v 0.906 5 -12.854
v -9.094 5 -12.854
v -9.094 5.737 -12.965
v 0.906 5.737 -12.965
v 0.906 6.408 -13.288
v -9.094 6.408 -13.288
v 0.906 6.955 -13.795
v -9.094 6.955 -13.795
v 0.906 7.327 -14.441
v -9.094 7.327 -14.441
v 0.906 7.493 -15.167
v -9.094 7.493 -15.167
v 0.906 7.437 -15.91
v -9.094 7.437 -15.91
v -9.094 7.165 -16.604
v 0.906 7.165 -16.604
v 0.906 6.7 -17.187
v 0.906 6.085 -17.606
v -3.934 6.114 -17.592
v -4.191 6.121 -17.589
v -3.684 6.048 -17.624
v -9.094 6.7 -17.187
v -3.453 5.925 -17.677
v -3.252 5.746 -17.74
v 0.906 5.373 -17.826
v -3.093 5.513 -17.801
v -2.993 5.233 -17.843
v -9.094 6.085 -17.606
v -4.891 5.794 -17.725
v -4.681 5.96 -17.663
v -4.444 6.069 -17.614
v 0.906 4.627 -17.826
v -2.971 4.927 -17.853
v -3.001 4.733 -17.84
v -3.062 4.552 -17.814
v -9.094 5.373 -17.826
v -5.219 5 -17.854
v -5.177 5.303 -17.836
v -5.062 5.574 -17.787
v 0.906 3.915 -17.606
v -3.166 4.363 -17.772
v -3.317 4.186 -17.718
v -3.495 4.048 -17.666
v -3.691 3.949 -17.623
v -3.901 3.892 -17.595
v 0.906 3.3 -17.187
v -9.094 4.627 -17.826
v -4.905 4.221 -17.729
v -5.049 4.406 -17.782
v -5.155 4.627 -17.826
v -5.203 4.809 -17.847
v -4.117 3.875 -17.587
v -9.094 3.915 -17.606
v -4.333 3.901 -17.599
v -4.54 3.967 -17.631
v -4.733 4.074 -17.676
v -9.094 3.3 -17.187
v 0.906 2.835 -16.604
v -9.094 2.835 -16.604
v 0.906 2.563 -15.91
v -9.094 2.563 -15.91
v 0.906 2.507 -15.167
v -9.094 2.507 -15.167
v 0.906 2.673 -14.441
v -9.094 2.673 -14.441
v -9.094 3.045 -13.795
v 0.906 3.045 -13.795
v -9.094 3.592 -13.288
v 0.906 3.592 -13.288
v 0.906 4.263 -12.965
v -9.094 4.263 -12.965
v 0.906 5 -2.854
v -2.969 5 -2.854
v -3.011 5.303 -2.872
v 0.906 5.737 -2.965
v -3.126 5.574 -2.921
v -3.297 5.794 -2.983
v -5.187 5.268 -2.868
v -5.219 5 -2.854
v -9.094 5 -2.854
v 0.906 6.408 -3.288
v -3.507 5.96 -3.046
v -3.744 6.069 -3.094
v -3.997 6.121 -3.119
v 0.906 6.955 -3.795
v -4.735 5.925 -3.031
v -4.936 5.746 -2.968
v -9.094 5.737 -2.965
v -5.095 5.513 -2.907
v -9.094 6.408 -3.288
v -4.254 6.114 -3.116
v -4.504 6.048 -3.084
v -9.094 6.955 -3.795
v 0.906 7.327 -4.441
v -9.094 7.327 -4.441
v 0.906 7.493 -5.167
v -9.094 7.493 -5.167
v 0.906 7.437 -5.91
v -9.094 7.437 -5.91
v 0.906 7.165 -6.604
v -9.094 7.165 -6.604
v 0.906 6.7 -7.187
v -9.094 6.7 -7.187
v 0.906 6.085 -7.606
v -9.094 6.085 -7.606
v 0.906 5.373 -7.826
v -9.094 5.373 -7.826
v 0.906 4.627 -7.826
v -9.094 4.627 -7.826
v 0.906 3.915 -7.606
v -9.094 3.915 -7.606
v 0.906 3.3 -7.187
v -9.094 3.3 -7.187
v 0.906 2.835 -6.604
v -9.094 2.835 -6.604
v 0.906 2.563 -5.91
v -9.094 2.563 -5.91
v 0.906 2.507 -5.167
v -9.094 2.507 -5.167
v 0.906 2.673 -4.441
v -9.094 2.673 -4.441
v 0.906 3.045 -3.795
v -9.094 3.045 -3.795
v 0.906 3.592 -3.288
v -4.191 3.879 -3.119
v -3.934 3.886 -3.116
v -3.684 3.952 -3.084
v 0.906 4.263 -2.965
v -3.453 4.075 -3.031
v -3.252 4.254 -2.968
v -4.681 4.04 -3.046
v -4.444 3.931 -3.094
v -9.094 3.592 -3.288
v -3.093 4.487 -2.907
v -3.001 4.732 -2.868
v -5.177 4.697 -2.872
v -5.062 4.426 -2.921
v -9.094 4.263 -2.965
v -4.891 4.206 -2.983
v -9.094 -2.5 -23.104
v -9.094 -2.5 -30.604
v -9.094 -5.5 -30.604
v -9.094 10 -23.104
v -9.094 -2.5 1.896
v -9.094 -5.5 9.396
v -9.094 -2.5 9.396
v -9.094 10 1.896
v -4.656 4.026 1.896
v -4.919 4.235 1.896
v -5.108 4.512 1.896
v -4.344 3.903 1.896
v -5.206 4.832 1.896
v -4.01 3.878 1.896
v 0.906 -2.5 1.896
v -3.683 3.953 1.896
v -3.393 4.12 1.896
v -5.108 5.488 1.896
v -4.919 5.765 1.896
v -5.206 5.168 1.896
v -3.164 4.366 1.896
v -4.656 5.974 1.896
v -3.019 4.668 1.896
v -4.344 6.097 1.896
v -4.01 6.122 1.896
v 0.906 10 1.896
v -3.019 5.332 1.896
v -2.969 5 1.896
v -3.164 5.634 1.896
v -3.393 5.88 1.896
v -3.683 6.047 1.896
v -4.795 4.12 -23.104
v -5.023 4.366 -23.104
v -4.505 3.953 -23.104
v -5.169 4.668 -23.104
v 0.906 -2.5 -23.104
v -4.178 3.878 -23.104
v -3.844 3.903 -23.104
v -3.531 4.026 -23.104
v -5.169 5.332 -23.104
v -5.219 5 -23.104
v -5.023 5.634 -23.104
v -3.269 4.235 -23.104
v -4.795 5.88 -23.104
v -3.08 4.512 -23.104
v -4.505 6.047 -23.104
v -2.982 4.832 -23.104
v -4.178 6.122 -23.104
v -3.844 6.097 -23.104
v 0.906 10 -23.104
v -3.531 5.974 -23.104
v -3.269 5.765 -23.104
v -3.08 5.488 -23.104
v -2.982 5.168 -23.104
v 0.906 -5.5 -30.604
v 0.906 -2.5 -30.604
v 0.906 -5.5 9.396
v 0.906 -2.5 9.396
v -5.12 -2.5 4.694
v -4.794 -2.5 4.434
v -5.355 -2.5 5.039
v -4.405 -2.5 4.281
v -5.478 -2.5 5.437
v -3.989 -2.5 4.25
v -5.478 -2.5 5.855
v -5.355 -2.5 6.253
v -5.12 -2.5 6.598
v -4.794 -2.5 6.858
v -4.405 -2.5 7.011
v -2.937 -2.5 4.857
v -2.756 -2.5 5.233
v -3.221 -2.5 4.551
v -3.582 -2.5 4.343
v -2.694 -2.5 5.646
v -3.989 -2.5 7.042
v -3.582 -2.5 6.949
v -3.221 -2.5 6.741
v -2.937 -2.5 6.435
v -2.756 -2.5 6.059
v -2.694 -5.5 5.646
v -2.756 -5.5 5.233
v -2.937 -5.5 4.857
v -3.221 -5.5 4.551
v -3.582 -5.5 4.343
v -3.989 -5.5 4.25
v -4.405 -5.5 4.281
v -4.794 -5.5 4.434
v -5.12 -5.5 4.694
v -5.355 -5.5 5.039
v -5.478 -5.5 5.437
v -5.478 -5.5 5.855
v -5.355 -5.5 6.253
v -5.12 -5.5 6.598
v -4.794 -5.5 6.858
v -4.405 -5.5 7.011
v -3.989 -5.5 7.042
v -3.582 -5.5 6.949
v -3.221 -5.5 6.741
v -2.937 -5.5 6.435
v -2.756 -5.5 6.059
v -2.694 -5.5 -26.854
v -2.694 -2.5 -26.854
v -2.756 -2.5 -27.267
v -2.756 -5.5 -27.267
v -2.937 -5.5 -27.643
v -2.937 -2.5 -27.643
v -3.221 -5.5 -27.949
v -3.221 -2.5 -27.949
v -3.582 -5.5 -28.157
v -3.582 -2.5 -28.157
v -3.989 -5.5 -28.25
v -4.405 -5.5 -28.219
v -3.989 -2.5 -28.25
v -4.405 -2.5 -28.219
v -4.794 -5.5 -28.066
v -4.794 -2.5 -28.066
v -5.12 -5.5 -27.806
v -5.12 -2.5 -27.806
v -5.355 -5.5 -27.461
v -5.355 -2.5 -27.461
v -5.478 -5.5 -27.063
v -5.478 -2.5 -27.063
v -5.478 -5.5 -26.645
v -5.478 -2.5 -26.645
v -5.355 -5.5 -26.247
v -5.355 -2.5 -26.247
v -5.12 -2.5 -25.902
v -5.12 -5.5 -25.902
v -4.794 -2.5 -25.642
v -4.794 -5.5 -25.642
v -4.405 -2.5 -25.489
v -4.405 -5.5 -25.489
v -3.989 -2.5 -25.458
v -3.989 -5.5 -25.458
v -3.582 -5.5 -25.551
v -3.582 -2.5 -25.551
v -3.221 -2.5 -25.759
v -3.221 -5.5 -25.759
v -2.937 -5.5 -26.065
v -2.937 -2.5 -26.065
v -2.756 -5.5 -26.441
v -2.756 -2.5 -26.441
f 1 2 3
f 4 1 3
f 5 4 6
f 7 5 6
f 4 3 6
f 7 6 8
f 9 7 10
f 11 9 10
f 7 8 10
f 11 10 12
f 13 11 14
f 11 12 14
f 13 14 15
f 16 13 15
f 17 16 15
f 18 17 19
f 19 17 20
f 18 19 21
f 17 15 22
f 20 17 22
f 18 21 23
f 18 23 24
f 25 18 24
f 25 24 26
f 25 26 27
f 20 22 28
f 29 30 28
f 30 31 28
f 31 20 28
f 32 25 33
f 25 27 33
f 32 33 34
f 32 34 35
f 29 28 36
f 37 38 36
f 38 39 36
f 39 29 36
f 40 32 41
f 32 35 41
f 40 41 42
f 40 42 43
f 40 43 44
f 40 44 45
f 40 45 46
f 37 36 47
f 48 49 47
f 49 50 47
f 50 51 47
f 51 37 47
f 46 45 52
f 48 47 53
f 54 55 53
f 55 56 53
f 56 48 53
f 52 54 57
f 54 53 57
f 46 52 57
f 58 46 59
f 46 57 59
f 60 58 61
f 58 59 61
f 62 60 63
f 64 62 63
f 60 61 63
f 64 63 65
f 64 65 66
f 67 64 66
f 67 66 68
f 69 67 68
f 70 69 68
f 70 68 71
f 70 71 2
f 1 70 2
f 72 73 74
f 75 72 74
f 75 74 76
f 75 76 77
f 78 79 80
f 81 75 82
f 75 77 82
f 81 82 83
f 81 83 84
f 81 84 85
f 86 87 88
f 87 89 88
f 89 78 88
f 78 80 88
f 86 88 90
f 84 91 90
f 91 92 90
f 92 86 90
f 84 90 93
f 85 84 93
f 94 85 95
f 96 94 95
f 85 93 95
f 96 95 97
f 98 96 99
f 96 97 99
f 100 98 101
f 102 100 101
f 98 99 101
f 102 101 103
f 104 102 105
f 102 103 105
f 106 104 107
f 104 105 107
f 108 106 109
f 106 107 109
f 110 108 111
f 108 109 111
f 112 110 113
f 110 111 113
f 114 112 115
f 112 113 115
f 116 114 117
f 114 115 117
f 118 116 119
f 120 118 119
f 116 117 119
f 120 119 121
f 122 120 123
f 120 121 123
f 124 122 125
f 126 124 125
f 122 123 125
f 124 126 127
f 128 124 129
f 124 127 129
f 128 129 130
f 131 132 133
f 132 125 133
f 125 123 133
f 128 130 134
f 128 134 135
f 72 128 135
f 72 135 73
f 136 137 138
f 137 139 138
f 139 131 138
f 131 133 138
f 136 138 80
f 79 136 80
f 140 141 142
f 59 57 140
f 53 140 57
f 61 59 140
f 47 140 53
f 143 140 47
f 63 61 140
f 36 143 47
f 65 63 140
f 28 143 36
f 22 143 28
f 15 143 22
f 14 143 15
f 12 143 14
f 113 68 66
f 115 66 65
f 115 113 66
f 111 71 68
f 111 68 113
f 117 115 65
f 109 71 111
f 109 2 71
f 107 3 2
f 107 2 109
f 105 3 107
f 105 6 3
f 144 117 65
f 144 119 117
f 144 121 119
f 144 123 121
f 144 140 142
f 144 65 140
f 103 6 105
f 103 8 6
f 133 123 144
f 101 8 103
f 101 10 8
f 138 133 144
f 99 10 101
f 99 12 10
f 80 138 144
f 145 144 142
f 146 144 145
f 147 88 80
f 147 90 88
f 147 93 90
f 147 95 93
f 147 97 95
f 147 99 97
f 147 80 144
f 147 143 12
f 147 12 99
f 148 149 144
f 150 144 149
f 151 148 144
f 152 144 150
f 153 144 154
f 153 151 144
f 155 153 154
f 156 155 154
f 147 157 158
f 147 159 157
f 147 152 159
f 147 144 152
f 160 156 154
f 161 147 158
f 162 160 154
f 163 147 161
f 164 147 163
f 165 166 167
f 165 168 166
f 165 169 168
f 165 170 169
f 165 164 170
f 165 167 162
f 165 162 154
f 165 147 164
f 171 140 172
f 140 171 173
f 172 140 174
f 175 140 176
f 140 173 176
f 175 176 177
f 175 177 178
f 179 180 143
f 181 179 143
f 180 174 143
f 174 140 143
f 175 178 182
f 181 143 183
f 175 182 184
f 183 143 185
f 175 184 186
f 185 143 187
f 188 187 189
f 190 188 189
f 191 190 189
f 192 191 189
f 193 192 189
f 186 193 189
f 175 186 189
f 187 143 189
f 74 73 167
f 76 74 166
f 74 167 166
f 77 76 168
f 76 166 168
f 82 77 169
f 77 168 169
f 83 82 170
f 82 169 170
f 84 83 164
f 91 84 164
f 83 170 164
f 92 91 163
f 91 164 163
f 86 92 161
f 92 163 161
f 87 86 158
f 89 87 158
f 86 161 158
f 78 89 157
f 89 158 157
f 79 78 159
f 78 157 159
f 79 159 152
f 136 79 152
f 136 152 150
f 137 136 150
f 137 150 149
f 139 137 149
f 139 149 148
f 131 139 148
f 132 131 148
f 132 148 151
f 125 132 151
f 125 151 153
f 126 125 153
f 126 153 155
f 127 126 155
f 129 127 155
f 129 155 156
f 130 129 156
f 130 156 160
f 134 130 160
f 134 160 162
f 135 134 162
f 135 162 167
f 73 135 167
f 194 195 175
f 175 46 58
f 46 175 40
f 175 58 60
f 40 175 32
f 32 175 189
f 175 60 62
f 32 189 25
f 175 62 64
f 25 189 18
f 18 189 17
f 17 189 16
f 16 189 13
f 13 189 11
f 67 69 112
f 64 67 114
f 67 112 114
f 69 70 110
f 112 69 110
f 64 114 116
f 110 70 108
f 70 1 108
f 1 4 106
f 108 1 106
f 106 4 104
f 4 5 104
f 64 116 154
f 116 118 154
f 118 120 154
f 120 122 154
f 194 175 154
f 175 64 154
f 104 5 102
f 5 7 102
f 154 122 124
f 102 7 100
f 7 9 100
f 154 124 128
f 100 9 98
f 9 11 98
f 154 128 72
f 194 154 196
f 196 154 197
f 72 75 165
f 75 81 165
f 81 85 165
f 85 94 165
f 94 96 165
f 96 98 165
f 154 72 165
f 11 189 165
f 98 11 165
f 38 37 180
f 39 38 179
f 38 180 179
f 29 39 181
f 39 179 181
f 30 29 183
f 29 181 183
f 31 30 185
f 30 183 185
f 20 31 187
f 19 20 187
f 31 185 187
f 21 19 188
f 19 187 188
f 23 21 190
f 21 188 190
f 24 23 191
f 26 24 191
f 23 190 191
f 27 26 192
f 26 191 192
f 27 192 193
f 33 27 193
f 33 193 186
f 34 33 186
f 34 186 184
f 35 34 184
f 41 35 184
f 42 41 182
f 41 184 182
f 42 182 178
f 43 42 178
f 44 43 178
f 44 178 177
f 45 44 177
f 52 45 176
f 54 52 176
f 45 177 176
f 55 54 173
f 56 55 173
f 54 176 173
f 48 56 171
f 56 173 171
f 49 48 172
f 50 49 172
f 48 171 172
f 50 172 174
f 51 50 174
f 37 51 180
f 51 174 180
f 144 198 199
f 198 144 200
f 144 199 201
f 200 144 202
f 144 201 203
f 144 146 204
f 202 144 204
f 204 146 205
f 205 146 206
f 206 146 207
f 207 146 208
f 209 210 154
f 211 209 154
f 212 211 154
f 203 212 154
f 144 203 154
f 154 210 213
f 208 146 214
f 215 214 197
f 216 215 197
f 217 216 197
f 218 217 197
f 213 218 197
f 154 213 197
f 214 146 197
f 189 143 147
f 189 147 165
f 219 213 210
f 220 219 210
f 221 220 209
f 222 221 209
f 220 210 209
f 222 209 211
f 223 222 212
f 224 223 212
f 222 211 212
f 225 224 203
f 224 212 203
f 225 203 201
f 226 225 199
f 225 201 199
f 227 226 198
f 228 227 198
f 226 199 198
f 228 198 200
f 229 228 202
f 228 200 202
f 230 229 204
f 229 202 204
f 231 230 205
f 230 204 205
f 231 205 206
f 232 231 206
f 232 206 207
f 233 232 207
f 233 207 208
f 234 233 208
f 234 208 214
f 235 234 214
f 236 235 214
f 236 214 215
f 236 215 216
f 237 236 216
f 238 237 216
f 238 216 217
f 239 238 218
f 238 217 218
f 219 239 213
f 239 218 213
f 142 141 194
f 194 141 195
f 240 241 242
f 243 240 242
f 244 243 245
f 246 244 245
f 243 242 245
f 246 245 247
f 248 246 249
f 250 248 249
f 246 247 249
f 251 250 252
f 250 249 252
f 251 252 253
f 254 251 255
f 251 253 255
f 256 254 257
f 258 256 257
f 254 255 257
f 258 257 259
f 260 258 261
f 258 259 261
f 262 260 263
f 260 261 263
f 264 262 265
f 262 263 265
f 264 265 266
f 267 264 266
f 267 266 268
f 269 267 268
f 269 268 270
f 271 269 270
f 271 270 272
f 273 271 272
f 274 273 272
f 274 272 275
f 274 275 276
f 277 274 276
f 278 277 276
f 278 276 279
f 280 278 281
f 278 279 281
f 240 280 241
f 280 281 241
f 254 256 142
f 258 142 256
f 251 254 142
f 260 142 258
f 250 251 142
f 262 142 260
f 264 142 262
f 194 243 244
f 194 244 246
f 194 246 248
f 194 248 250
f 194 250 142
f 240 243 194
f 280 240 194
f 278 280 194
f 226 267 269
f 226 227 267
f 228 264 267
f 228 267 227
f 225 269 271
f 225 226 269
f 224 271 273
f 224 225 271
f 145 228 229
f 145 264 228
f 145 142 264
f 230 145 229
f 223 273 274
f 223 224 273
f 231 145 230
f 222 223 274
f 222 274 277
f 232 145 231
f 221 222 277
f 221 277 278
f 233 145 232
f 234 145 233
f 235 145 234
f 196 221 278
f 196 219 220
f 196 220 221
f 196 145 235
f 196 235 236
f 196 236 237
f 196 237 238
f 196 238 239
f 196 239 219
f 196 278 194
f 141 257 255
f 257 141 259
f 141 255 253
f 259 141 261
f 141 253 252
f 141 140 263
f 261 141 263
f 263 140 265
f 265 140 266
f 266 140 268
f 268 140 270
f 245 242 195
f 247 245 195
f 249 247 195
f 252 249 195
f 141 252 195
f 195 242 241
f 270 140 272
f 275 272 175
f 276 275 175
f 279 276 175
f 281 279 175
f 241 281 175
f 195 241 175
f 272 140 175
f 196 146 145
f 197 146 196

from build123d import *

# Parameters (mm, degrees)
SKETCH_1_W          = 10
SKETCH_1_H          = 25
EXTRUDE_1_DEPTH     = 10
SKETCH_2_R          = 2.5
CUT_EXTRUDE_1_DEPTH = 10
CUT_EXTRUDE_2_REACH = 27
SKETCH_3_R          = 1.125
CUT_EXTRUDE_3_REACH = 27
SKETCH_4_R          = 1.125
SKETCH_5_W          = 10
SKETCH_5_H          = 25
EXTRUDE_2_DEPTH     = 2.5
SKETCH_6_W          = 10
SKETCH_6_H          = 40
EXTRUDE_3_DEPTH     = 3
SKETCH_7_R          = 1.4
CUT_EXTRUDE_4_DEPTH = 3


with BuildPart() as part:
    # 스케치1 → 보스-돌출1 (new body)
    with BuildSketch(Plane(origin=(0, 0, 0), x_dir=(1, 0, 0), z_dir=(0, 1, 0))):
        with Locations((-4.093959732, 10.604026846)):
            Rectangle(SKETCH_1_W, SKETCH_1_H)
    extrude(amount=EXTRUDE_1_DEPTH)

    # 스케치2 → 컷-돌출1 (cut)
    with BuildSketch(Plane.ZY.offset(9.093959732)):
        with Locations((-5.354026846, 5)):
            Circle(SKETCH_2_R)
        with Locations((-15.354026846, 5)):
            Circle(SKETCH_2_R)
    extrude(amount=-CUT_EXTRUDE_1_DEPTH, mode=Mode.SUBTRACT)

    # 스케치3 → 컷-돌출2 (cut, up to next)
    with BuildSketch(Plane.XY.offset(1.895973154), mode=Mode.PRIVATE) as cut_extrude_2_sk1:
        with Locations((-4.093959732, 5)):
            Circle(SKETCH_3_R)
    cut_extrude_2_tool1 = extrude(cut_extrude_2_sk1.sketch, amount=-CUT_EXTRUDE_2_REACH, mode=Mode.PRIVATE) & part.part
    add(cut_extrude_2_tool1.solids().sort_by_distance((-4.09396, 5, 1.895973))[0], mode=Mode.SUBTRACT)

    # 스케치4 → 컷-돌출3 (cut, up to next)
    with BuildSketch(Plane(origin=(0, 0, -23.104026846), x_dir=(-1, 0, 0), z_dir=(0, 0, -1)), mode=Mode.PRIVATE) as cut_extrude_3_sk1:
        with Locations((4.093959732, 5)):
            Circle(SKETCH_4_R)
    cut_extrude_3_tool1 = extrude(cut_extrude_3_sk1.sketch, amount=-CUT_EXTRUDE_3_REACH, mode=Mode.PRIVATE) & part.part
    add(cut_extrude_3_tool1.solids().sort_by_distance((-4.09396, 5, -23.104027))[0], mode=Mode.SUBTRACT)

    # 스케치5 → 보스-돌출2 (add)
    with BuildSketch(Plane.XZ):
        with Locations((-4.093959732, -10.604026846)):
            Rectangle(SKETCH_5_W, SKETCH_5_H)
    extrude(amount=EXTRUDE_2_DEPTH)

    # 스케치6 → 보스-돌출3 (add)
    with BuildSketch(Plane.XZ.offset(2.5)):
        with Locations((-4.093959732, -10.604026846)):
            Rectangle(SKETCH_6_W, SKETCH_6_H)
    extrude(amount=EXTRUDE_3_DEPTH)

    # 스케치7 → 컷-돌출4 (cut)
    with BuildSketch(Plane(origin=(0, -2.5, 0), x_dir=(1, 0, 0), z_dir=(0, 1, 0))):
        with Locations((-4.093959732, -5.645973154)):
            Circle(SKETCH_7_R)
        with Locations((-4.093959732, 26.854026846)):
            Circle(SKETCH_7_R)
    extrude(amount=-CUT_EXTRUDE_4_DEPTH, mode=Mode.SUBTRACT)


solid = part.part
